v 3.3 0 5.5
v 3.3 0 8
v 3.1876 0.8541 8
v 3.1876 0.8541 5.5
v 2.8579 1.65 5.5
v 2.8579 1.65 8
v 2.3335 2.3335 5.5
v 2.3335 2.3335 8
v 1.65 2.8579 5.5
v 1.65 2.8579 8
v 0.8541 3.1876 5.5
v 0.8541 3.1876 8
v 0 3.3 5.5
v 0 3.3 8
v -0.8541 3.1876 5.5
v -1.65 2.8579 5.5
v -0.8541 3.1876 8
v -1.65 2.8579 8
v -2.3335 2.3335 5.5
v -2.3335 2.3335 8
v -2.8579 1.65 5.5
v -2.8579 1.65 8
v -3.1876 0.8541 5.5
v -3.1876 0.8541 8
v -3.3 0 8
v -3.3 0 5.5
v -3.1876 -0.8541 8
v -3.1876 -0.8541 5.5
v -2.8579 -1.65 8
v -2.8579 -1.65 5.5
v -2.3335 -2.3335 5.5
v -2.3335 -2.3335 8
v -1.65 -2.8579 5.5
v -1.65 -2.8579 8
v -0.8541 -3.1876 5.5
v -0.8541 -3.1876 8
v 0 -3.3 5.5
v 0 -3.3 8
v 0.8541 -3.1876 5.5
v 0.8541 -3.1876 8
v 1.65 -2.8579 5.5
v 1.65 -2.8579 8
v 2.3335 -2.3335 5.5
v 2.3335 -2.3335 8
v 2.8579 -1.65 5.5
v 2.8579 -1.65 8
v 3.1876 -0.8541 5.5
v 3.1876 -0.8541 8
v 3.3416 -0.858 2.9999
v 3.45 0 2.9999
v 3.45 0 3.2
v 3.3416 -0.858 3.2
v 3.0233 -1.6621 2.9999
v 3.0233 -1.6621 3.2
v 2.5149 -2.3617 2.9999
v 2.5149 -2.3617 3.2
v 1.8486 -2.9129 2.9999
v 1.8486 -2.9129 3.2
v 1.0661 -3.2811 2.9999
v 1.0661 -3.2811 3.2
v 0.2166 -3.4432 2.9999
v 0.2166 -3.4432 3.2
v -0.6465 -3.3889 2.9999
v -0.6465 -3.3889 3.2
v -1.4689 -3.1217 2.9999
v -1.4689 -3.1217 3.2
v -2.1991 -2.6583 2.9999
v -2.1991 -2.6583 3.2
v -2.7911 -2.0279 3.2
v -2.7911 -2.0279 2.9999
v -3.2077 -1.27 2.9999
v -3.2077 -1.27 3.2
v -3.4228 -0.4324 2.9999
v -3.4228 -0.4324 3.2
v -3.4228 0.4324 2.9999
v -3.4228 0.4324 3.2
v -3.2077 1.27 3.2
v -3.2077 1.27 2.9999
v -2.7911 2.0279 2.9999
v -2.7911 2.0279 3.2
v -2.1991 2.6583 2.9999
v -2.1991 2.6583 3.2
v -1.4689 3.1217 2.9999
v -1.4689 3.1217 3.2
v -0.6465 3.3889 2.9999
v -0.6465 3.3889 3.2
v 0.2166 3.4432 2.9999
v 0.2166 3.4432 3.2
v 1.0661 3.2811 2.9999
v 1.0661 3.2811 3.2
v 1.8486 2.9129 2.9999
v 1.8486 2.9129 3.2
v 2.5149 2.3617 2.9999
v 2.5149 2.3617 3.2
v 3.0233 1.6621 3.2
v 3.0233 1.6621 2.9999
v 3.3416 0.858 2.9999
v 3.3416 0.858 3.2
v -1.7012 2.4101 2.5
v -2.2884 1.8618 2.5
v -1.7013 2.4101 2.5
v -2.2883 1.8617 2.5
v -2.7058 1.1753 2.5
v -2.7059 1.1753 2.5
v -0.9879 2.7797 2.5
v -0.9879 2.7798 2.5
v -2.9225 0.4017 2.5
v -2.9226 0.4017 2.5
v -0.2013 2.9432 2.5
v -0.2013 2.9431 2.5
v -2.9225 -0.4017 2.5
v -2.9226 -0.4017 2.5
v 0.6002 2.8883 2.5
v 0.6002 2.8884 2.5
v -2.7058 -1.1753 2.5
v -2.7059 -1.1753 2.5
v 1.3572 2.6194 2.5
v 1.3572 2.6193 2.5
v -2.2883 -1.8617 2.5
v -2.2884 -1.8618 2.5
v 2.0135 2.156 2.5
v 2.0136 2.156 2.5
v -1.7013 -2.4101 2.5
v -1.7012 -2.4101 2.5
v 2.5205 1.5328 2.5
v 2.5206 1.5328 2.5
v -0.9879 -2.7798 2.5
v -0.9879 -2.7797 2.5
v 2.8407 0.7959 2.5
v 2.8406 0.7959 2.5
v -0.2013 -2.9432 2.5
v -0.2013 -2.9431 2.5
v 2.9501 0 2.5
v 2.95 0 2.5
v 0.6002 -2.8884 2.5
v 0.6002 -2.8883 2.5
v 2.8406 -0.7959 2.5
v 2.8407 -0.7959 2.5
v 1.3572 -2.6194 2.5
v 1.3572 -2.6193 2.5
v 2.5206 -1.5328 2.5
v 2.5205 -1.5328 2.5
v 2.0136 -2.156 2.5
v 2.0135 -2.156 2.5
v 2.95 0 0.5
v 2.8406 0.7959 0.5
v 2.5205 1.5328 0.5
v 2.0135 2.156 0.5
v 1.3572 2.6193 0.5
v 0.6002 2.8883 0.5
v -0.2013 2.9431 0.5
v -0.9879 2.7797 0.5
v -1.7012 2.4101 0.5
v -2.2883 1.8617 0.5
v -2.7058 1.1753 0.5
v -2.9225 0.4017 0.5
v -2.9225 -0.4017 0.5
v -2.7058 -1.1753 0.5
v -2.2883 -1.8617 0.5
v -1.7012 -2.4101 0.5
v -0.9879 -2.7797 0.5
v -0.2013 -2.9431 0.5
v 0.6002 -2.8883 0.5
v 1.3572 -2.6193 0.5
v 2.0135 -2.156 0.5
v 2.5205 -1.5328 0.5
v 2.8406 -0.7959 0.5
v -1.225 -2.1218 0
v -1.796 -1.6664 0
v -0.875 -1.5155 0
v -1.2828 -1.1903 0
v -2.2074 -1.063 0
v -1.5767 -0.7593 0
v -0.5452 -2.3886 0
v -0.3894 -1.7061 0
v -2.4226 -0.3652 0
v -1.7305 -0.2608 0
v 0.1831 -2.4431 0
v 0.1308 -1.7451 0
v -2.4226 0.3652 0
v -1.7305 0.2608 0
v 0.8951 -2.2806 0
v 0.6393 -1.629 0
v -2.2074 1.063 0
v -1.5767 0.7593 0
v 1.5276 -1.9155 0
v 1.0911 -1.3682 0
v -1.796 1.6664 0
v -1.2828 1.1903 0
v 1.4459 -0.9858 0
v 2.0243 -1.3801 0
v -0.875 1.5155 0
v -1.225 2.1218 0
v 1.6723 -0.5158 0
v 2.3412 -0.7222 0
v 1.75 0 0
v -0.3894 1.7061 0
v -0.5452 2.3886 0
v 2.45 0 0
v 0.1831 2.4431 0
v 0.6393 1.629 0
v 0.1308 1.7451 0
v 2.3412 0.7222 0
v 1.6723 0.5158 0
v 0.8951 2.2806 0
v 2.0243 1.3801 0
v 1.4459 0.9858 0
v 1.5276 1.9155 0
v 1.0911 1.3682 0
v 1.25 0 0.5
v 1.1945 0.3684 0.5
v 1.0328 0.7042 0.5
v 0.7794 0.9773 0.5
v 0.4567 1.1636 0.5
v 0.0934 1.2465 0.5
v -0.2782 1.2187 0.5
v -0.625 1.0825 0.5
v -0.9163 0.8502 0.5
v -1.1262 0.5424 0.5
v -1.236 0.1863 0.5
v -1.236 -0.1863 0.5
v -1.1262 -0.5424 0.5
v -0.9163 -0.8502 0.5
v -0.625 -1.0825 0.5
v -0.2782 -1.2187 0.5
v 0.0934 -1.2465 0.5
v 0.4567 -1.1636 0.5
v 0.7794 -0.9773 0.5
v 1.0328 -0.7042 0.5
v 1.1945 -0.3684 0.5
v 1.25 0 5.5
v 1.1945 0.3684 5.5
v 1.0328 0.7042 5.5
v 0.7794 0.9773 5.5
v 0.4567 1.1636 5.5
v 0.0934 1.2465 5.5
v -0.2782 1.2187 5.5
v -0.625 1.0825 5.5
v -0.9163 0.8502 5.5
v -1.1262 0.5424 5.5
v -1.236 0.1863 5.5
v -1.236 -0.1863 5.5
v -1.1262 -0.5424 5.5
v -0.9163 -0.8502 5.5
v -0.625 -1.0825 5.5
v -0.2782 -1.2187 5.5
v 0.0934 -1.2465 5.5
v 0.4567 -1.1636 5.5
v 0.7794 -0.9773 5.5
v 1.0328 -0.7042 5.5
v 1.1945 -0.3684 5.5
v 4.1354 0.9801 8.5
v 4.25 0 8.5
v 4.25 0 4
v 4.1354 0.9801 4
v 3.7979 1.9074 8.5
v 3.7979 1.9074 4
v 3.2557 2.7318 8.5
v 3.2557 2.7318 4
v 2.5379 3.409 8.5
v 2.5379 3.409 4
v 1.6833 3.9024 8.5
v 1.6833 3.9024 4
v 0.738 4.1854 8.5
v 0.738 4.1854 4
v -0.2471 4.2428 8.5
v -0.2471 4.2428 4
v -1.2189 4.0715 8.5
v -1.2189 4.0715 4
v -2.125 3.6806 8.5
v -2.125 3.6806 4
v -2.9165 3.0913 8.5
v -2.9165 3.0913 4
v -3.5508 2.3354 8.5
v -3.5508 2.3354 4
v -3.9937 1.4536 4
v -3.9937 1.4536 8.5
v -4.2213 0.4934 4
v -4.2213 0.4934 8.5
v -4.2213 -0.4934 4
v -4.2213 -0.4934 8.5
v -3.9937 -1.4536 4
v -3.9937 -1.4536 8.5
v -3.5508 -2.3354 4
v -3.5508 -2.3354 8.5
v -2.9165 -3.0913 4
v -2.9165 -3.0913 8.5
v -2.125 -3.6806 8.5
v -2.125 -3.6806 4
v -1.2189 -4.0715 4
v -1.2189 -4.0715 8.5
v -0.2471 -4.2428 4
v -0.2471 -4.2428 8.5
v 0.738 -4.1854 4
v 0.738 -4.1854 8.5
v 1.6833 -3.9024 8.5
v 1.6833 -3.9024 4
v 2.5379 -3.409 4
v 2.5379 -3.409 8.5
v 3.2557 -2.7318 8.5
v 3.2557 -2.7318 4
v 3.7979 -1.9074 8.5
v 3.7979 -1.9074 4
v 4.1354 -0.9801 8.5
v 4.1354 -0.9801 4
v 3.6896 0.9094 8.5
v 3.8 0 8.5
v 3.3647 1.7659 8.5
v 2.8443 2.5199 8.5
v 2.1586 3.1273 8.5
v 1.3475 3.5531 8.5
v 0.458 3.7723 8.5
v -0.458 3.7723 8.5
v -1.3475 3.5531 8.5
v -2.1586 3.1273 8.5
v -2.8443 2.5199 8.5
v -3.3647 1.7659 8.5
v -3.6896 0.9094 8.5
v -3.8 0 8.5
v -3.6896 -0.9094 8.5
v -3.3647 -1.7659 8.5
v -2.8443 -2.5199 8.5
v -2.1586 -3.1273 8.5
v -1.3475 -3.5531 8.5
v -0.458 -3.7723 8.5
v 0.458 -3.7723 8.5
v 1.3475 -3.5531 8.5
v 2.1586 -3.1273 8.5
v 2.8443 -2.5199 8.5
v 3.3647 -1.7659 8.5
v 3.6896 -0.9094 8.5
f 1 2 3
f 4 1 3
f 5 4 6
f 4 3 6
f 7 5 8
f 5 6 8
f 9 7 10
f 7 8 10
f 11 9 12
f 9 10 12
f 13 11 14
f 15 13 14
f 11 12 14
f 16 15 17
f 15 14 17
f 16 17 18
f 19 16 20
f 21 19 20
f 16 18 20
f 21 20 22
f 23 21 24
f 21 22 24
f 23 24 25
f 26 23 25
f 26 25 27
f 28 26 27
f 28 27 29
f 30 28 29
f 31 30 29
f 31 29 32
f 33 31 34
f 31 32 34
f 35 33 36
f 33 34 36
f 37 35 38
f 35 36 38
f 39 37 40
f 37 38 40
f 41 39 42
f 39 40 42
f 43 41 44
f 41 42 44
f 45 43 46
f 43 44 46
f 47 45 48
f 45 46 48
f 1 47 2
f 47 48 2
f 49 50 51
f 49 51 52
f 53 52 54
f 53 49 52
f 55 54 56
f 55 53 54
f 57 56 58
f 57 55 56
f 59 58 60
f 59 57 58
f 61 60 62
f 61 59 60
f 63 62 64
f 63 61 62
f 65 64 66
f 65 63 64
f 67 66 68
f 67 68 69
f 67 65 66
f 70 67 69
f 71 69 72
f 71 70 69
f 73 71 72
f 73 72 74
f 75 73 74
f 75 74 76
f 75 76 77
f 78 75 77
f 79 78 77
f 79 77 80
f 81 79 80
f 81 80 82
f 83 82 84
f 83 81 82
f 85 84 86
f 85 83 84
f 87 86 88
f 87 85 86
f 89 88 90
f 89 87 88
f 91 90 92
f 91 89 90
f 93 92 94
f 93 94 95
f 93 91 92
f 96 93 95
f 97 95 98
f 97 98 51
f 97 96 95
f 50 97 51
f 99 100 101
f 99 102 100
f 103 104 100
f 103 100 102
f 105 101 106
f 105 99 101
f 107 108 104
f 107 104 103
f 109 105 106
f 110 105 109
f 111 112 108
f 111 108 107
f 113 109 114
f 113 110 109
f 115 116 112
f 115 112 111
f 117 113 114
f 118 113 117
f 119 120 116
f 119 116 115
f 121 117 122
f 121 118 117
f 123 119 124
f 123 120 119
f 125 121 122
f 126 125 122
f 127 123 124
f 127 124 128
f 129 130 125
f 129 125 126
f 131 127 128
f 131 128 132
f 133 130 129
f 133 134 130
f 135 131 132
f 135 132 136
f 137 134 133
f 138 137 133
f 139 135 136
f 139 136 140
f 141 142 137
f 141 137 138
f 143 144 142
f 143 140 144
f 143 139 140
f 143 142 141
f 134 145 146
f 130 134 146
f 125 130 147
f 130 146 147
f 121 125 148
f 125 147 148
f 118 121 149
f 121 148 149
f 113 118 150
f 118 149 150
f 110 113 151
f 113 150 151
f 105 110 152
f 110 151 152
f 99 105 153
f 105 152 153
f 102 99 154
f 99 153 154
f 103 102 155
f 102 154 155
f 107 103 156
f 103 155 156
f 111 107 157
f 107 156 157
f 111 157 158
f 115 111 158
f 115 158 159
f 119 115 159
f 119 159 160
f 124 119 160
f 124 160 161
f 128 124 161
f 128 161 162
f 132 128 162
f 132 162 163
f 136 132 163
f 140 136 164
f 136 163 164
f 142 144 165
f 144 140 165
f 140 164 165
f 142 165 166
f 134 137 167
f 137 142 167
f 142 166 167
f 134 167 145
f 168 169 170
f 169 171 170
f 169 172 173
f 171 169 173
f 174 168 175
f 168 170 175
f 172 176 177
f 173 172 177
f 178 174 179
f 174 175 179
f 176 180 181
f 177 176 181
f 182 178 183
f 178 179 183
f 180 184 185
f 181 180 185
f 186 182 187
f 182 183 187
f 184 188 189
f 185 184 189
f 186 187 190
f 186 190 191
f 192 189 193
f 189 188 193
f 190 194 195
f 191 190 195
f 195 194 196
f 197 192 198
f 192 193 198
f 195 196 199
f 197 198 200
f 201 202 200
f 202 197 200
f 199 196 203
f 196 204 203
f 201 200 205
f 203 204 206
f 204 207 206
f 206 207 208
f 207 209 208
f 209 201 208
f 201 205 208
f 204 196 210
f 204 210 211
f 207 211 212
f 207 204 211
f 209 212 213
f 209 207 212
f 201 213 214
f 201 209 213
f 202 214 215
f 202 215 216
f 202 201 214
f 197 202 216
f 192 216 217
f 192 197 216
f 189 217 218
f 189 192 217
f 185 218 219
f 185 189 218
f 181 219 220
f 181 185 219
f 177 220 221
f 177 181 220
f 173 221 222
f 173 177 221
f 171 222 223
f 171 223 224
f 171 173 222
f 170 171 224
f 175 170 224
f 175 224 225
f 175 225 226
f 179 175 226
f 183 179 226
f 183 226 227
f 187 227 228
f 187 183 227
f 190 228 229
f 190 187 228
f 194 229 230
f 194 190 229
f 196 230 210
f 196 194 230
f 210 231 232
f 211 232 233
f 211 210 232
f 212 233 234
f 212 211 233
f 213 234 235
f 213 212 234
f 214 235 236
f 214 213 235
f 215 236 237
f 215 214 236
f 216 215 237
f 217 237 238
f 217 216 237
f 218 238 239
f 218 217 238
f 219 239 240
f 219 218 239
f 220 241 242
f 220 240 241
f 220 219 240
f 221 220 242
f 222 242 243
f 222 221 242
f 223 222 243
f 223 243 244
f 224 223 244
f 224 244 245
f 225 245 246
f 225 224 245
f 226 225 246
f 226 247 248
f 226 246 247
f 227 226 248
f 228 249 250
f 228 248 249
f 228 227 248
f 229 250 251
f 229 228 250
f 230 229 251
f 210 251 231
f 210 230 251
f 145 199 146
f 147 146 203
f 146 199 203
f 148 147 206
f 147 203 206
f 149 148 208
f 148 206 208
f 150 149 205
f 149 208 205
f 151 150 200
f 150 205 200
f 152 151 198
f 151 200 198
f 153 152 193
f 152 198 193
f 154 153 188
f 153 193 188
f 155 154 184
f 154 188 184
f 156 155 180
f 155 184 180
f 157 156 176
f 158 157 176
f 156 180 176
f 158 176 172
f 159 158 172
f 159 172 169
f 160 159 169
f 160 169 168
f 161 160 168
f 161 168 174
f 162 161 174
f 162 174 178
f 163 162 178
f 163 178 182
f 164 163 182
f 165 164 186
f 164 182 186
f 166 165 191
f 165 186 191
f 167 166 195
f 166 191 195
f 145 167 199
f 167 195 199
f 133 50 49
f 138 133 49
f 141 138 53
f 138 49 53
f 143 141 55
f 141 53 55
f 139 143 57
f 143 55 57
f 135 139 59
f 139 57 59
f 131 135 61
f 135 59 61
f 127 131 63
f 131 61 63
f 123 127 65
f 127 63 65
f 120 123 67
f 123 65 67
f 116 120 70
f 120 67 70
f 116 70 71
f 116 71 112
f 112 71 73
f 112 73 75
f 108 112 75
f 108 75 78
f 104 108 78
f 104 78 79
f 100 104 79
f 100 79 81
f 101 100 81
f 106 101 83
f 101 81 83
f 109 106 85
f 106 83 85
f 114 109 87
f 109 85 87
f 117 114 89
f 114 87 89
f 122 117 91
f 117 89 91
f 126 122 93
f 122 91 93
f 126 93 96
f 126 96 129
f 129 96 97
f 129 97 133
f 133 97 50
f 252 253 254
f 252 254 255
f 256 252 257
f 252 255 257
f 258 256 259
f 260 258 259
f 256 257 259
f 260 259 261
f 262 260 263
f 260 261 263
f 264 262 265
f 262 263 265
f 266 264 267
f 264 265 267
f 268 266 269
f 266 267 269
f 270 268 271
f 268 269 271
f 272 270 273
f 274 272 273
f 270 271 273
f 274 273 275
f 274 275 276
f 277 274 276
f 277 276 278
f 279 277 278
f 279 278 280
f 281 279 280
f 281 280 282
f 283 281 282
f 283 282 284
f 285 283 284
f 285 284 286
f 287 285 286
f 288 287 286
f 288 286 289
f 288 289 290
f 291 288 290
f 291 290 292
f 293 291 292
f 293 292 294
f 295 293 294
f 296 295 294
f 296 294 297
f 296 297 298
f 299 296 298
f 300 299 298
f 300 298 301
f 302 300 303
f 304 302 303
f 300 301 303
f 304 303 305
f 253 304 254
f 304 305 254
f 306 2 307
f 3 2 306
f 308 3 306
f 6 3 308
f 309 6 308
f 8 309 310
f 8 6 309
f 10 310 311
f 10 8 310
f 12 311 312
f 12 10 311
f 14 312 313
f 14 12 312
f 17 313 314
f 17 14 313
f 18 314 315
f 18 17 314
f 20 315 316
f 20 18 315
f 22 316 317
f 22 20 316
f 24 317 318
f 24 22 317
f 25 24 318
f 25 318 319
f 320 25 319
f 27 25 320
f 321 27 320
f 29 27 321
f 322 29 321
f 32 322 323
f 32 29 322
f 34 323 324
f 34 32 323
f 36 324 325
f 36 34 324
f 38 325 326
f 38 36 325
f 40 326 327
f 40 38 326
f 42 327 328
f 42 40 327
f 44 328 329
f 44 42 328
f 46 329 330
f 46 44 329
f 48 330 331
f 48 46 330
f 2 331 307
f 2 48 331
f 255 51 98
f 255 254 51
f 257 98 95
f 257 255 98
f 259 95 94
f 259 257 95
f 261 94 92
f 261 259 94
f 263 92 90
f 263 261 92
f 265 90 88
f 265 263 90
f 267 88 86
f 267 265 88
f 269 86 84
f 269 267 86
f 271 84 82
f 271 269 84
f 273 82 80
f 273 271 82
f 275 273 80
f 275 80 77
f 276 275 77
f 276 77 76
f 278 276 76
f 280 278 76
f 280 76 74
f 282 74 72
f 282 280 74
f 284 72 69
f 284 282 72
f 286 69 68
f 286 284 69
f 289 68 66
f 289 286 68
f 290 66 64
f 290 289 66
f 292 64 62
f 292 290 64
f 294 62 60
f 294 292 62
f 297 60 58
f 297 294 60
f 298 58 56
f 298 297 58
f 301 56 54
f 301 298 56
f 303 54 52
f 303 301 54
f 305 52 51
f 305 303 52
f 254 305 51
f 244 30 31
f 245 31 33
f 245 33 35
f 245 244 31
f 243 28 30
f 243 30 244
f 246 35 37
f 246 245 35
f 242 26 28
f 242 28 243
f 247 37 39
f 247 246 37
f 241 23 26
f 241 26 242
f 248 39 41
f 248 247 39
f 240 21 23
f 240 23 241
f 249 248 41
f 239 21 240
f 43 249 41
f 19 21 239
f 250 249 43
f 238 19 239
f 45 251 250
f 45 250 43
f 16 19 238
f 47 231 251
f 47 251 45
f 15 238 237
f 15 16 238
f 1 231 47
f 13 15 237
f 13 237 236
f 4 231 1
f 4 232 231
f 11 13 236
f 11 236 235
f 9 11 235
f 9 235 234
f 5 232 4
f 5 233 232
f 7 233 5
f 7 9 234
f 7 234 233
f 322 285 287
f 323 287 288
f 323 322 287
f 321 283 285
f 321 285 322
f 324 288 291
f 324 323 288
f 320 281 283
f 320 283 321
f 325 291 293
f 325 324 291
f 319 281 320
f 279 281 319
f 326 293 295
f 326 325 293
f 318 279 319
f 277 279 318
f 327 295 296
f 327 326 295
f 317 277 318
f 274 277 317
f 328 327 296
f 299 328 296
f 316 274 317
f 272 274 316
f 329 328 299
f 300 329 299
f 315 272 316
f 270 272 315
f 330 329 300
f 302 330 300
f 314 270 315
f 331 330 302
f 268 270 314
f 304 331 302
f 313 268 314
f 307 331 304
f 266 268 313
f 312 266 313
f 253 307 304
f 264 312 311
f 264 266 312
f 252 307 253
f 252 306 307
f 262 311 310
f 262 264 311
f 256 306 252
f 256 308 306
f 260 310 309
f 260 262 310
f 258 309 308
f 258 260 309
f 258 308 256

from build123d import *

# Parameters (mm, degrees)
SKETCH1_R           = 2.95
SKETCH1_R_2         = 1.25
BOSS_EXTRUDE1_DEPTH = 3
SKETCH2_R           = 4.25
SKETCH2_R_2         = 1.25
BOSS_EXTRUDE2_DEPTH = 5.5
SKETCH3_R           = 3.3
CUT_EXTRUDE1_DEPTH  = 3
CHAMFER1_SIZE       = 0.5
CHAMFER2_SIZE       = 0.5
BOSS_EXTRUDE3_START = 0.5
SKETCH4_R           = 3.45
SKETCH4_R_2         = 1.25
BOSS_EXTRUDE3_DEPTH = 0.5
CHAMFER3_SIZE       = 1
CHAMFER4_SIZE       = 0.5
CHAMFER6_SIZE       = 0.5


# Some blends are built 0.0001 mm under size
with BuildPart() as part:
    # Sketch1 → Boss-Extrude1 (new body)
    with BuildSketch(Plane.XY):
        Circle(SKETCH1_R)
        Circle(SKETCH1_R_2, mode=Mode.SUBTRACT)
    extrude(amount=BOSS_EXTRUDE1_DEPTH)

    # Sketch2 → Boss-Extrude2 (add)
    with BuildSketch(Plane.XY.offset(3)):
        Circle(SKETCH2_R)
        Circle(SKETCH2_R_2, mode=Mode.SUBTRACT)
    extrude(amount=BOSS_EXTRUDE2_DEPTH)

    # Sketch3 → Cut-Extrude1 (cut)
    with BuildSketch(Plane.XY.offset(8.5)):
        Circle(SKETCH3_R)
    extrude(amount=-CUT_EXTRUDE1_DEPTH, mode=Mode.SUBTRACT)

    # Chamfer1
    chamfer1_edges = [part.edges().sort_by_distance(p)[0] for p in [
        (-3.3, 0, 8.5),
    ]]
    chamfer(chamfer1_edges, length=CHAMFER1_SIZE)

    # Chamfer2
    chamfer2_edges = [part.edges().sort_by_distance(p)[0] for p in [
        (-2.95, 0, 0),
    ]]
    chamfer(chamfer2_edges, length=CHAMFER2_SIZE)

    # Sketch4 → Boss-Extrude3 (add)
    with BuildSketch(Plane(origin=(0, 0, 3), x_dir=(-1, 0, 0), z_dir=(0, 0, -1)).offset(BOSS_EXTRUDE3_START)):
        with Locations(Location((0, 0, 0), (0, 0, 180))):
            Circle(SKETCH4_R)
        with Locations(Location((0, 0, 0), (0, 0, 180))):
            Circle(SKETCH4_R_2, mode=Mode.SUBTRACT)
    extrude(amount=-BOSS_EXTRUDE3_DEPTH)

    # Chamfer3
    # the kernel refuses this chamfer: 1 mm, written as the material it takes off along each edge
    with BuildSketch(Plane(origin=(0, 0, 3), x_dir=(1, 0, 0), z_dir=(0, -1, 0))) as chamfer3_piece_1_section:
        Polygon((4.25 - CHAMFER3_SIZE, 0), (4.25, CHAMFER3_SIZE), (4.25, 0), align=None)
    chamfer3_piece_1 = revolve(axis=Axis((0, 0, 3), (0, 0, 1)), mode=Mode.PRIVATE)
    chamfer3_piece_1 = chamfer3_piece_1 - Plane(origin=(0, 0, 3.597538835), x_dir=(1, 0, 0), z_dir=(0, 0, -1)) * Cylinder(3.45, 17, mode=Mode.PRIVATE)
    add(chamfer3_piece_1, mode=Mode.SUBTRACT)

    # Chamfer4
    chamfer4_edges = [part.edges().sort_by_distance(p)[0] for p in [
        (-1.25, 0, 0),
    ]]
    chamfer(chamfer4_edges, length=CHAMFER4_SIZE)

    # Chamfer6
    chamfer6_edges = [part.edges().sort_by_distance(p)[0] for p in [
        (-3.45, 0, 2.5),
    ]]
    chamfer(chamfer6_edges, length=CHAMFER6_SIZE - 0.0001)  # a hair under: the kernel refuses the full size


solid = part.part
